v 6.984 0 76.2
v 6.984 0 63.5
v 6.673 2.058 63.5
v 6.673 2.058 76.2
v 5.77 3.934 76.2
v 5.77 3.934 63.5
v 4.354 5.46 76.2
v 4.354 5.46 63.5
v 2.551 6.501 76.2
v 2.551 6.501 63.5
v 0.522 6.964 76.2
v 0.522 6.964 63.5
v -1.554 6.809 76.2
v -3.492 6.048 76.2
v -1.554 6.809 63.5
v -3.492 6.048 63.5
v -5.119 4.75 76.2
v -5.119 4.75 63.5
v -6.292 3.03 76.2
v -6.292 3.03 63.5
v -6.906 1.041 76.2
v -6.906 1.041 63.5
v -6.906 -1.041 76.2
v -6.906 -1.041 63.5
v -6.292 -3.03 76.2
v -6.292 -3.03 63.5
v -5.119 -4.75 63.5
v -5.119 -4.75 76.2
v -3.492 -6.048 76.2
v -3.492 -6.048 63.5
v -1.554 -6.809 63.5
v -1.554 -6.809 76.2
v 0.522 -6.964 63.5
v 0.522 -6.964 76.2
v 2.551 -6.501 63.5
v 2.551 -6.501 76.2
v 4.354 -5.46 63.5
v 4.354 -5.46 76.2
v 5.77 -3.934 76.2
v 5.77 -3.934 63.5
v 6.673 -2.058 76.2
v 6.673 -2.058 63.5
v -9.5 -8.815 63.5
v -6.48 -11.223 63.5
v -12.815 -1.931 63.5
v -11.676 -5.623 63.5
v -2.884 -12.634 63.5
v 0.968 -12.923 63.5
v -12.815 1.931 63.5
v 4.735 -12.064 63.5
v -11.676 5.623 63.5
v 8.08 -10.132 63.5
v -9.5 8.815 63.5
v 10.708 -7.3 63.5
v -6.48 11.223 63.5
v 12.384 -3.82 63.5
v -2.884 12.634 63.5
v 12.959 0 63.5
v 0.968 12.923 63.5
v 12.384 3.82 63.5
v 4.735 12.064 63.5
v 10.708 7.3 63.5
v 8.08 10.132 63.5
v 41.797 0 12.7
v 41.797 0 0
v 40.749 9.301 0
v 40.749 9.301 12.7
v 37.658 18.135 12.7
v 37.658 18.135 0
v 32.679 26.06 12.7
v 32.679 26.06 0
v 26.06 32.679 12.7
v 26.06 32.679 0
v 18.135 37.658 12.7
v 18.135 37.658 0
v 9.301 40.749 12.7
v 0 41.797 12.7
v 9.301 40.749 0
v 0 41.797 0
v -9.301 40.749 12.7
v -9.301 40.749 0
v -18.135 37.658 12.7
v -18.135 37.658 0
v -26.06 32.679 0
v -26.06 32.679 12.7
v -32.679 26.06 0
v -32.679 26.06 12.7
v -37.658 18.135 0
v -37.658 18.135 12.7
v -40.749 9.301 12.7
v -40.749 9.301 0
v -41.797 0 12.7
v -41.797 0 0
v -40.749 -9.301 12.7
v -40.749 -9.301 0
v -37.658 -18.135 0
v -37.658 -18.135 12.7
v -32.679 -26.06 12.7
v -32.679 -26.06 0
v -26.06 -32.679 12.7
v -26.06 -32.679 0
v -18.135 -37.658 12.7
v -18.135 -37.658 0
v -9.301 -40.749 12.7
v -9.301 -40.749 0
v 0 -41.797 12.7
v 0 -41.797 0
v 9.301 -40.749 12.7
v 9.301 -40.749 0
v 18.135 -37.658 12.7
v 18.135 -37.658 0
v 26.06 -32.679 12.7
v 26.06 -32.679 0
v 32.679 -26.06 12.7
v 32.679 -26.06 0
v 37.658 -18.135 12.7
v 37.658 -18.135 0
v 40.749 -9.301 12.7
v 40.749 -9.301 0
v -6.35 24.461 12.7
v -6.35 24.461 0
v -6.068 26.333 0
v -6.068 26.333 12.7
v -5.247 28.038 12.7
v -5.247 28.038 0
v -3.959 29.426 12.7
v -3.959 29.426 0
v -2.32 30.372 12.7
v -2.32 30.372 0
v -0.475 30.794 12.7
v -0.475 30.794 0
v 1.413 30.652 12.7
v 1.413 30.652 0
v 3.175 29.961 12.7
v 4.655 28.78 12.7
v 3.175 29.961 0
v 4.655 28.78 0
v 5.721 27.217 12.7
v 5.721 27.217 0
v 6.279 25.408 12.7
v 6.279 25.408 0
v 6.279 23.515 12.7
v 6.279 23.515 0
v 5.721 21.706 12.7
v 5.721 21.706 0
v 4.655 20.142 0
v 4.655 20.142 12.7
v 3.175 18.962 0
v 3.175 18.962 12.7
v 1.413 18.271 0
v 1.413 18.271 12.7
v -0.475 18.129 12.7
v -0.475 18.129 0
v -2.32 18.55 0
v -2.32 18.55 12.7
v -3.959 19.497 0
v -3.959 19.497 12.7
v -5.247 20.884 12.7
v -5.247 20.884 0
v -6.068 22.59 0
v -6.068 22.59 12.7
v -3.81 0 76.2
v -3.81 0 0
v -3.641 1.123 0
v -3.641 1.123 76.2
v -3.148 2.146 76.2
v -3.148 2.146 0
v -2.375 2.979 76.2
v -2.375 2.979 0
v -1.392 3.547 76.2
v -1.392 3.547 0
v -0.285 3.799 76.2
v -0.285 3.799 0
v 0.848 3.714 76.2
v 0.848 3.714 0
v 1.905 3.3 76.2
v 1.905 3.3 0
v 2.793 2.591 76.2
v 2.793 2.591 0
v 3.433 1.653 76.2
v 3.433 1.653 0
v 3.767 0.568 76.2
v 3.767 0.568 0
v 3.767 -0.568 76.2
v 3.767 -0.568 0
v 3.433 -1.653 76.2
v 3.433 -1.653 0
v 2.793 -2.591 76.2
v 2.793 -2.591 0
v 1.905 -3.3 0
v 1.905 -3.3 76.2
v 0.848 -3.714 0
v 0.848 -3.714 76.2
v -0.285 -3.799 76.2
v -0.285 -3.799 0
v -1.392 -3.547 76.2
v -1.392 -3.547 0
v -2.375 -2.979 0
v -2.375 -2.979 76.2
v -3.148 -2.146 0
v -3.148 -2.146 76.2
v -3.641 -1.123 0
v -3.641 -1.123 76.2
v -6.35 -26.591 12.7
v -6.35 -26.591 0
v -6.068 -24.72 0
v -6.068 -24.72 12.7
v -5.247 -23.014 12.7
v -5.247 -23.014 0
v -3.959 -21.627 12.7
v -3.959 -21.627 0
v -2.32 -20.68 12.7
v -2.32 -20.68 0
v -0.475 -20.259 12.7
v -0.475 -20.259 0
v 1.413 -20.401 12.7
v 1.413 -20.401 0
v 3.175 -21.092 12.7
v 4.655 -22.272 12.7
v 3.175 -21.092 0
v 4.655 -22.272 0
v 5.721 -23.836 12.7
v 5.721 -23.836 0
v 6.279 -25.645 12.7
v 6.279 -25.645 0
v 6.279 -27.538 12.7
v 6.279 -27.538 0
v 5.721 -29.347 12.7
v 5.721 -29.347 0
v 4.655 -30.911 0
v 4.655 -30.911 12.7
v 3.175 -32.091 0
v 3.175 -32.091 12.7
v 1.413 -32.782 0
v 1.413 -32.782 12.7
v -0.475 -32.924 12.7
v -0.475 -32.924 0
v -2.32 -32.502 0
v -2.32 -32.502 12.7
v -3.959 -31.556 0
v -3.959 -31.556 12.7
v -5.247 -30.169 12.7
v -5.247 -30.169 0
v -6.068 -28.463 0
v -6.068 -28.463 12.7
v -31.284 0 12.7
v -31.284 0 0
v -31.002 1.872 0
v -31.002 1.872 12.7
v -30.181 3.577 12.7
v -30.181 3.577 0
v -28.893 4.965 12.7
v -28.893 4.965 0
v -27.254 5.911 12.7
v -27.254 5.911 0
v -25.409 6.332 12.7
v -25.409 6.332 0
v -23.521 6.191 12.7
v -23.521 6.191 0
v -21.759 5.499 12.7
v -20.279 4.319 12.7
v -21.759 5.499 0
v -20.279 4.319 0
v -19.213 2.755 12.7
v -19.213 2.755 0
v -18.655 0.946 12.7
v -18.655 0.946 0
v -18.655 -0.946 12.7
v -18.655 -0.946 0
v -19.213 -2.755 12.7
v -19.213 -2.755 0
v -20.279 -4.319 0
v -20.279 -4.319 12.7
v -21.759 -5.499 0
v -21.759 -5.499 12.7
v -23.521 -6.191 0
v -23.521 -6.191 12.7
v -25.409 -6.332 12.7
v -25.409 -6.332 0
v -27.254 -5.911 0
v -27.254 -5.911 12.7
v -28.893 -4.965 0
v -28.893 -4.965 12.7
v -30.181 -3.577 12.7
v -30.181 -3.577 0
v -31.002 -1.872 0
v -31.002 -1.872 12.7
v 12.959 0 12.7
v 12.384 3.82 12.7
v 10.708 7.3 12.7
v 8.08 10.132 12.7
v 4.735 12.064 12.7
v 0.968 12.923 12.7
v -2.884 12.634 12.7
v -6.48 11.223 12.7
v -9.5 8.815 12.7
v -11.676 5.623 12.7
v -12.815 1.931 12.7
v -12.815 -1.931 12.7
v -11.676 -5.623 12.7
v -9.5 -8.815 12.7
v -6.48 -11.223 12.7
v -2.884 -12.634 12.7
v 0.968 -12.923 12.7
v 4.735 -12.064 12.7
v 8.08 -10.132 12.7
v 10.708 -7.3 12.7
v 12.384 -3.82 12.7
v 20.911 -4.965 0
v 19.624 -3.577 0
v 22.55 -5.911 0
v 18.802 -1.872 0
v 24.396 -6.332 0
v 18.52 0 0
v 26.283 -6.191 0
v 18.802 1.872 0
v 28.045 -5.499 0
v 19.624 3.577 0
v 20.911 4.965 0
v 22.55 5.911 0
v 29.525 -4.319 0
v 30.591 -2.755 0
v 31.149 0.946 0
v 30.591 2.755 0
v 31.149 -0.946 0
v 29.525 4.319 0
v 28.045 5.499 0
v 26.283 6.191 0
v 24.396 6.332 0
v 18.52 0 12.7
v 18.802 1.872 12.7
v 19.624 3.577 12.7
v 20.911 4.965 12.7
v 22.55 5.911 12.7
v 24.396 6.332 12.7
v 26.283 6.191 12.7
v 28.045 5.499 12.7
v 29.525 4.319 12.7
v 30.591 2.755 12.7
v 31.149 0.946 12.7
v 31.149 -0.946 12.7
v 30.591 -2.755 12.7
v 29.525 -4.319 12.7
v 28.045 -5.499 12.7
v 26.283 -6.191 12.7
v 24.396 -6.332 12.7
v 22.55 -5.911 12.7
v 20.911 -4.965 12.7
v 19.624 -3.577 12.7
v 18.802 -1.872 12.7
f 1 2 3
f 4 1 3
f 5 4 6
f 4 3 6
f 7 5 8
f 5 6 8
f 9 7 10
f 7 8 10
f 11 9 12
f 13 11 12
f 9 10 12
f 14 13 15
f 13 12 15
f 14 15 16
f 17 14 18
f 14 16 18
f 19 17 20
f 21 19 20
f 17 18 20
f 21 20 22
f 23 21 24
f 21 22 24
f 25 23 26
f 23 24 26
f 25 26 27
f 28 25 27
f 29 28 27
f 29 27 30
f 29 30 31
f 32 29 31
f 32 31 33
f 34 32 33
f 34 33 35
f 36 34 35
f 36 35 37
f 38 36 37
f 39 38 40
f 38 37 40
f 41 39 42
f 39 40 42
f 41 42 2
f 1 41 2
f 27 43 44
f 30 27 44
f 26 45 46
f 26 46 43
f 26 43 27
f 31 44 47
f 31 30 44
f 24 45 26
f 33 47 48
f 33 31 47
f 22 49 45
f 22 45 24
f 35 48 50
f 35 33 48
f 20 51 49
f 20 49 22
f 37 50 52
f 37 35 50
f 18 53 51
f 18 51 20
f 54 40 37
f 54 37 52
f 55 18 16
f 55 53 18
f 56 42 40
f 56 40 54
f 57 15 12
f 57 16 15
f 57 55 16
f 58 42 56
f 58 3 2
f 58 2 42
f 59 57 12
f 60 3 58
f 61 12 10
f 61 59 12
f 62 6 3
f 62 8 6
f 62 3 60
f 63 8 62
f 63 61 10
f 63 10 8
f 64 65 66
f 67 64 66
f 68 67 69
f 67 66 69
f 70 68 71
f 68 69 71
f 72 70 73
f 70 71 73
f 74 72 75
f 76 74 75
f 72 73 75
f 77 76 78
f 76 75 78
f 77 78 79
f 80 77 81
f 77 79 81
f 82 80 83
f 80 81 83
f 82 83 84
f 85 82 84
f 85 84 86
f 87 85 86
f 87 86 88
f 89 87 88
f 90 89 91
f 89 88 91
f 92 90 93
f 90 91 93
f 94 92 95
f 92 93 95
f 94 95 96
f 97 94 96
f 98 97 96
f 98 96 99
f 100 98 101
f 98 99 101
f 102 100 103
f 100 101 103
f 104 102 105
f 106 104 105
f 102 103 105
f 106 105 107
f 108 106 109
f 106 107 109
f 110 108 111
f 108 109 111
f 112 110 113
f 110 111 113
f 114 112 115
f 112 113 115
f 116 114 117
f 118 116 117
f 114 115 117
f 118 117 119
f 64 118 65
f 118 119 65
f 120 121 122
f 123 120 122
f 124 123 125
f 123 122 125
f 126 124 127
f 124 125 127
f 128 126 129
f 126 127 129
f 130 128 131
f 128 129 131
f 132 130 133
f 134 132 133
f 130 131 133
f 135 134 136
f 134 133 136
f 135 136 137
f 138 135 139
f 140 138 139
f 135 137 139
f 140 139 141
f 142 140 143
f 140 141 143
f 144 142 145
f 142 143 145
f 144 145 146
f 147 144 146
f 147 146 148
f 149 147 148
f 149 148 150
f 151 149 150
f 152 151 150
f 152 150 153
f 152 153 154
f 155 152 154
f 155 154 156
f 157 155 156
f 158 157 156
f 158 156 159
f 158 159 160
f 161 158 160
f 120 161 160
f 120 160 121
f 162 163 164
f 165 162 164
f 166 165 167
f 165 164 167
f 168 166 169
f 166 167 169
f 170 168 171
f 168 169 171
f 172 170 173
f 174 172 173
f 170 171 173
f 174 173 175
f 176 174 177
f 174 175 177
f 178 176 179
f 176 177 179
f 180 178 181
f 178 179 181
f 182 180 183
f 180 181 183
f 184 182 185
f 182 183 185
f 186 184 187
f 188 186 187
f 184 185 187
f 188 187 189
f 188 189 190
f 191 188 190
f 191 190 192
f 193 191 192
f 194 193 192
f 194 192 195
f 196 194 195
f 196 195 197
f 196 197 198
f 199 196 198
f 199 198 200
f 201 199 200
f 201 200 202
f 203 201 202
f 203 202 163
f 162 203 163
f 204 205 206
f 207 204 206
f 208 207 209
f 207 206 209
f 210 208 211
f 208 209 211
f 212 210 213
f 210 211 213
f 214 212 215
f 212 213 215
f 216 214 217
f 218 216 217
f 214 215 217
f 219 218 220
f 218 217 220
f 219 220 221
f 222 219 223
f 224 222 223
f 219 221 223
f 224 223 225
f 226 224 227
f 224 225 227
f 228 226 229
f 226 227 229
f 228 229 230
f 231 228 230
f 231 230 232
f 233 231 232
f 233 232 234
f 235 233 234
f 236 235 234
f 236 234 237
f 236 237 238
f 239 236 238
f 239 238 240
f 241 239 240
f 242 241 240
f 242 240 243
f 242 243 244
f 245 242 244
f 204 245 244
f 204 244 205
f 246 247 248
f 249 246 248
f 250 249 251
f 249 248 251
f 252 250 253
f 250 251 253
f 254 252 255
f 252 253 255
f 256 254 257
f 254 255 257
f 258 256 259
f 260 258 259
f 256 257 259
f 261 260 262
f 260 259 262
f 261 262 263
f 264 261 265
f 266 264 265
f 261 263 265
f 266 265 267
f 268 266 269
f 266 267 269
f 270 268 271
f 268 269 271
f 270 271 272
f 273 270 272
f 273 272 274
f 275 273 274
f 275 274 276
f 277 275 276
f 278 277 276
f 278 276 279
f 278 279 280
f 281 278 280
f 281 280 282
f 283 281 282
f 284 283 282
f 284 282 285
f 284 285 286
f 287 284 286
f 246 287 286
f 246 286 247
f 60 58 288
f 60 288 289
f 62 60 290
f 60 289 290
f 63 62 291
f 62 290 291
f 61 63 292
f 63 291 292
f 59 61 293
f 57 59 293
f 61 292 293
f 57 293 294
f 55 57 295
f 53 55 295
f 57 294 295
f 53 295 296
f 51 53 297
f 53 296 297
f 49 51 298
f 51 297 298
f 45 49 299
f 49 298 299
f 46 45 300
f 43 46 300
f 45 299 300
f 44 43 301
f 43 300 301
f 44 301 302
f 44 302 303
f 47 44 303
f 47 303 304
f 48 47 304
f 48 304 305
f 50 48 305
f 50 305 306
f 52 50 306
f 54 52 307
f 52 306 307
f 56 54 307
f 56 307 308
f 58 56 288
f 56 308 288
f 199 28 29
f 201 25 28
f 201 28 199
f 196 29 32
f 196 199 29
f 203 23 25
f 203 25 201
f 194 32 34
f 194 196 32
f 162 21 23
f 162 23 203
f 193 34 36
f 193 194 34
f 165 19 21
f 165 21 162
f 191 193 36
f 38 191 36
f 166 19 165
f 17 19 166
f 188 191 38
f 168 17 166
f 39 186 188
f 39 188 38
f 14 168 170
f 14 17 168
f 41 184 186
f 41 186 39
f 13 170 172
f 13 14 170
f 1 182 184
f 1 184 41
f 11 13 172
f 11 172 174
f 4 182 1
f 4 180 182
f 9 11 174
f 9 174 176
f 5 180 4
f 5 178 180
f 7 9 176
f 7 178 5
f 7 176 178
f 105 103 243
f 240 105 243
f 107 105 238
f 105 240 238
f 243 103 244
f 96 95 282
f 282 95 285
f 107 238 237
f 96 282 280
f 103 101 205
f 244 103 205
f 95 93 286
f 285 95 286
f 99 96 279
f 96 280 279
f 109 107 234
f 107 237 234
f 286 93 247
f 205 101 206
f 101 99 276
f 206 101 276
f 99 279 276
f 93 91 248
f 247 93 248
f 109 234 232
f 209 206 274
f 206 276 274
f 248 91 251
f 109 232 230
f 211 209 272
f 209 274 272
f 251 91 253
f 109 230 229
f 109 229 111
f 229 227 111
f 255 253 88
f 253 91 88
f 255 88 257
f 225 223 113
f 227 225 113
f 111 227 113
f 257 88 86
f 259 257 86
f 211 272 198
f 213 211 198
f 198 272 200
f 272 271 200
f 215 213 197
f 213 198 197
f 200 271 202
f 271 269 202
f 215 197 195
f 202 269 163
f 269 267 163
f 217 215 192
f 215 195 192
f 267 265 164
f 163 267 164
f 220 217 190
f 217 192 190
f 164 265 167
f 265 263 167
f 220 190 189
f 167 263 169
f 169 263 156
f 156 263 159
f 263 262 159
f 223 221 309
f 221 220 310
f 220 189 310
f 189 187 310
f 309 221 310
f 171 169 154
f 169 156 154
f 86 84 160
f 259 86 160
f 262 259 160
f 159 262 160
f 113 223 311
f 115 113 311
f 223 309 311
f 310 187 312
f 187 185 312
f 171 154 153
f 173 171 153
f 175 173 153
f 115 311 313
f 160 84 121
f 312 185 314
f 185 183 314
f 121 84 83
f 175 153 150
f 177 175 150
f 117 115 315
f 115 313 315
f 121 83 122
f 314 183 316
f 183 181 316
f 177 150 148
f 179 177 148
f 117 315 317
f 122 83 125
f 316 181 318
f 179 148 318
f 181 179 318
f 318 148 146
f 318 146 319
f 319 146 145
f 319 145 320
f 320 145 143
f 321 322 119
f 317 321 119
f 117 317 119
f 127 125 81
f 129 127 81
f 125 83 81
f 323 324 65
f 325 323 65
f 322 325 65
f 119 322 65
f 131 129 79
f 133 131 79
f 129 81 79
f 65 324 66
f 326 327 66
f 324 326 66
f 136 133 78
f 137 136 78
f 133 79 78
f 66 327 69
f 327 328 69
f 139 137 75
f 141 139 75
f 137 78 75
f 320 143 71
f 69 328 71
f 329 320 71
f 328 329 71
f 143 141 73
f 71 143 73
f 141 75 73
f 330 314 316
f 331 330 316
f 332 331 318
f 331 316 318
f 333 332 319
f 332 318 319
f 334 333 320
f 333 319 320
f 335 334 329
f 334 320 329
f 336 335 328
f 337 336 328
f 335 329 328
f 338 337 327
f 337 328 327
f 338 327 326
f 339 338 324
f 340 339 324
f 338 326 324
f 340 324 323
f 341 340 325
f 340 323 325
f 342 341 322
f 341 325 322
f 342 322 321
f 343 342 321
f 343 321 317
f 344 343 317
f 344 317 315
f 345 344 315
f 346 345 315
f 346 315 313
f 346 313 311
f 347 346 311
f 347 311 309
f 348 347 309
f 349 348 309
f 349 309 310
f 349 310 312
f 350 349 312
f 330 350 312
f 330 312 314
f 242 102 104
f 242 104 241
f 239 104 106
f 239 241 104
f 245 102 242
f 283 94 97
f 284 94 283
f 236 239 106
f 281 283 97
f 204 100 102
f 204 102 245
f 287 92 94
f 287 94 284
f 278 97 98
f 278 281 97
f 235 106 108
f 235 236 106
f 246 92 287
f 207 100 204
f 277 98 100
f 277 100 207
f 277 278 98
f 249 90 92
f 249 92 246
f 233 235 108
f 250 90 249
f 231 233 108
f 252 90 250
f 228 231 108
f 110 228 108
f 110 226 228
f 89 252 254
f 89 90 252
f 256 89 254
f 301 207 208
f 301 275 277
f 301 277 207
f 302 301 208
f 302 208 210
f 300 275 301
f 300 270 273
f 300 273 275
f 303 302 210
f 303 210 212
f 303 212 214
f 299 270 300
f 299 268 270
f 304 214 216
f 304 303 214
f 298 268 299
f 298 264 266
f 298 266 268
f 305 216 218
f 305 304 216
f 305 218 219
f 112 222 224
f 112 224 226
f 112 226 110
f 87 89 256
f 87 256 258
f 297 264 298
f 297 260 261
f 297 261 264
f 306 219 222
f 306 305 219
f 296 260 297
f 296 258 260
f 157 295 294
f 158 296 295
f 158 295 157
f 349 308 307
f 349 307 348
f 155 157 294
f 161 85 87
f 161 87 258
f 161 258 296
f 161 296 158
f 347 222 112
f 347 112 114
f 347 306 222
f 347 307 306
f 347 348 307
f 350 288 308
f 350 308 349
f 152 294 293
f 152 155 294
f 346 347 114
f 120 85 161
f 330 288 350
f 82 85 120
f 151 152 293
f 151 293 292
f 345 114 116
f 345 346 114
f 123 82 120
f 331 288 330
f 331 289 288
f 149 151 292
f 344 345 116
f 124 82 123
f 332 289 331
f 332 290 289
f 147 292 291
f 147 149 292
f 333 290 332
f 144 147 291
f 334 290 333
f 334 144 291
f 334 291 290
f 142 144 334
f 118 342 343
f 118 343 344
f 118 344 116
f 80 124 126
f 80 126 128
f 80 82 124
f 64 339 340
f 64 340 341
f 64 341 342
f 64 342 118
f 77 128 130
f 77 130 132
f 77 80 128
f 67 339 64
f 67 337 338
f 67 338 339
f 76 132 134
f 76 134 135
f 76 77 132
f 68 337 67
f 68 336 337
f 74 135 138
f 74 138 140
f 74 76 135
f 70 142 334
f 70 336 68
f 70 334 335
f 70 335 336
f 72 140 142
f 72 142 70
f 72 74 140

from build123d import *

# Parameters (mm, degrees)
F0_R     = 41.79738
F1_DEPTH = 12.7
F2_R     = 12.959367
F3_DEPTH = 50.8
F4_R     = 6.983691
F5_DEPTH = 12.7
F8_D     = 7.62
F10_D    = 12.7


with BuildPart() as f1:
    # F0 (on Top) → F1 (new body)
    with BuildSketch(Plane.XY):
        Circle(F0_R)
    extrude(amount=F1_DEPTH)

    # F2 (on face) → F3 (join)
    with BuildSketch(Plane.XY.offset(12.7)):
        Circle(F2_R)
    extrude(amount=F3_DEPTH)

    # F4 (on face) → F5 (join)
    with BuildSketch(Plane.XY.offset(63.5)):
        Circle(F4_R)
    extrude(amount=F5_DEPTH)

    # F8 (through all)
    with Locations(Plane.XY.offset(76.2)):
        with Locations((0, 0)):
            Hole(F8_D / 2)

    # F10 (through all)
    with Locations(Plane.XY.offset(12.7)):
        with Locations((0, -26.591428), (-24.934307, 0), (24.870217, 0), (0, 24.461392)):
            Hole(F10_D / 2)


solid = f1.part
